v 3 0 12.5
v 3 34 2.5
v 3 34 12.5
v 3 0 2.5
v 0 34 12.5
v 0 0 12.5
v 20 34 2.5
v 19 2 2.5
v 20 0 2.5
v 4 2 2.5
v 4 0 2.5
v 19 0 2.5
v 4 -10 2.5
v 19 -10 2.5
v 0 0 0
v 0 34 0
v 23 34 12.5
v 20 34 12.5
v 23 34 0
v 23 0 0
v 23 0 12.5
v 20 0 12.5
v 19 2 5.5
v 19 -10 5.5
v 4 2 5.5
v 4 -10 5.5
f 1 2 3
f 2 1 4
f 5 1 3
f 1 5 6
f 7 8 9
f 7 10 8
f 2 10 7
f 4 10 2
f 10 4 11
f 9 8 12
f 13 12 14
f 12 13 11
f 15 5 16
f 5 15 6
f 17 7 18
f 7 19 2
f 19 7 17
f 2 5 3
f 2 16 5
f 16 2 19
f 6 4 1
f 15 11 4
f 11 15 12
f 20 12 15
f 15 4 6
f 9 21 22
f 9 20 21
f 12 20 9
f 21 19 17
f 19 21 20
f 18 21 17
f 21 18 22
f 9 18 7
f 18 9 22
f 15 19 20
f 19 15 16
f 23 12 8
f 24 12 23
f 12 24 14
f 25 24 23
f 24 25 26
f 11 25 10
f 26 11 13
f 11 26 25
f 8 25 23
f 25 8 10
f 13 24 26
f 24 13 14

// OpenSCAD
echo(version=version());

// Values are in millimeters

$fa=1;
$fs=1;
////////////////////////////

function moteino_dims(has_ftdi_pins=true, has_headers = "top") = [
	(23),
	(34 + (has_ftdi_pins?10:0)),
	(2.5 + ((has_headers)?10:0))
	];
	


module moteino(has_ftdi_pins=true, has_headers = "top") {
	motenio = [23, 34, 2.5];
	cube(motenio);

	if(has_ftdi_pins) {
		translate([4, -10, motenio[2]]) {
			cube([15, 12, 3]);
		}
	}
	header = [3, motenio[1], 10];
	if(has_headers == "top") {
		translate([0, 0, motenio[2]]) cube(header);
		translate([(motenio[0] - header[0]), 0, motenio[2]]) cube(header);
	} else if (has_headers == "bot" || has_headers == "bottom") {
		translate([0, 0, -header[2]]) cube(header);
		translate([(motenio[0] - header[0]), 0, -header[2]]) cube(header);
	}
}


moteino();

// vim: set ai sw=2 ts=2 :
